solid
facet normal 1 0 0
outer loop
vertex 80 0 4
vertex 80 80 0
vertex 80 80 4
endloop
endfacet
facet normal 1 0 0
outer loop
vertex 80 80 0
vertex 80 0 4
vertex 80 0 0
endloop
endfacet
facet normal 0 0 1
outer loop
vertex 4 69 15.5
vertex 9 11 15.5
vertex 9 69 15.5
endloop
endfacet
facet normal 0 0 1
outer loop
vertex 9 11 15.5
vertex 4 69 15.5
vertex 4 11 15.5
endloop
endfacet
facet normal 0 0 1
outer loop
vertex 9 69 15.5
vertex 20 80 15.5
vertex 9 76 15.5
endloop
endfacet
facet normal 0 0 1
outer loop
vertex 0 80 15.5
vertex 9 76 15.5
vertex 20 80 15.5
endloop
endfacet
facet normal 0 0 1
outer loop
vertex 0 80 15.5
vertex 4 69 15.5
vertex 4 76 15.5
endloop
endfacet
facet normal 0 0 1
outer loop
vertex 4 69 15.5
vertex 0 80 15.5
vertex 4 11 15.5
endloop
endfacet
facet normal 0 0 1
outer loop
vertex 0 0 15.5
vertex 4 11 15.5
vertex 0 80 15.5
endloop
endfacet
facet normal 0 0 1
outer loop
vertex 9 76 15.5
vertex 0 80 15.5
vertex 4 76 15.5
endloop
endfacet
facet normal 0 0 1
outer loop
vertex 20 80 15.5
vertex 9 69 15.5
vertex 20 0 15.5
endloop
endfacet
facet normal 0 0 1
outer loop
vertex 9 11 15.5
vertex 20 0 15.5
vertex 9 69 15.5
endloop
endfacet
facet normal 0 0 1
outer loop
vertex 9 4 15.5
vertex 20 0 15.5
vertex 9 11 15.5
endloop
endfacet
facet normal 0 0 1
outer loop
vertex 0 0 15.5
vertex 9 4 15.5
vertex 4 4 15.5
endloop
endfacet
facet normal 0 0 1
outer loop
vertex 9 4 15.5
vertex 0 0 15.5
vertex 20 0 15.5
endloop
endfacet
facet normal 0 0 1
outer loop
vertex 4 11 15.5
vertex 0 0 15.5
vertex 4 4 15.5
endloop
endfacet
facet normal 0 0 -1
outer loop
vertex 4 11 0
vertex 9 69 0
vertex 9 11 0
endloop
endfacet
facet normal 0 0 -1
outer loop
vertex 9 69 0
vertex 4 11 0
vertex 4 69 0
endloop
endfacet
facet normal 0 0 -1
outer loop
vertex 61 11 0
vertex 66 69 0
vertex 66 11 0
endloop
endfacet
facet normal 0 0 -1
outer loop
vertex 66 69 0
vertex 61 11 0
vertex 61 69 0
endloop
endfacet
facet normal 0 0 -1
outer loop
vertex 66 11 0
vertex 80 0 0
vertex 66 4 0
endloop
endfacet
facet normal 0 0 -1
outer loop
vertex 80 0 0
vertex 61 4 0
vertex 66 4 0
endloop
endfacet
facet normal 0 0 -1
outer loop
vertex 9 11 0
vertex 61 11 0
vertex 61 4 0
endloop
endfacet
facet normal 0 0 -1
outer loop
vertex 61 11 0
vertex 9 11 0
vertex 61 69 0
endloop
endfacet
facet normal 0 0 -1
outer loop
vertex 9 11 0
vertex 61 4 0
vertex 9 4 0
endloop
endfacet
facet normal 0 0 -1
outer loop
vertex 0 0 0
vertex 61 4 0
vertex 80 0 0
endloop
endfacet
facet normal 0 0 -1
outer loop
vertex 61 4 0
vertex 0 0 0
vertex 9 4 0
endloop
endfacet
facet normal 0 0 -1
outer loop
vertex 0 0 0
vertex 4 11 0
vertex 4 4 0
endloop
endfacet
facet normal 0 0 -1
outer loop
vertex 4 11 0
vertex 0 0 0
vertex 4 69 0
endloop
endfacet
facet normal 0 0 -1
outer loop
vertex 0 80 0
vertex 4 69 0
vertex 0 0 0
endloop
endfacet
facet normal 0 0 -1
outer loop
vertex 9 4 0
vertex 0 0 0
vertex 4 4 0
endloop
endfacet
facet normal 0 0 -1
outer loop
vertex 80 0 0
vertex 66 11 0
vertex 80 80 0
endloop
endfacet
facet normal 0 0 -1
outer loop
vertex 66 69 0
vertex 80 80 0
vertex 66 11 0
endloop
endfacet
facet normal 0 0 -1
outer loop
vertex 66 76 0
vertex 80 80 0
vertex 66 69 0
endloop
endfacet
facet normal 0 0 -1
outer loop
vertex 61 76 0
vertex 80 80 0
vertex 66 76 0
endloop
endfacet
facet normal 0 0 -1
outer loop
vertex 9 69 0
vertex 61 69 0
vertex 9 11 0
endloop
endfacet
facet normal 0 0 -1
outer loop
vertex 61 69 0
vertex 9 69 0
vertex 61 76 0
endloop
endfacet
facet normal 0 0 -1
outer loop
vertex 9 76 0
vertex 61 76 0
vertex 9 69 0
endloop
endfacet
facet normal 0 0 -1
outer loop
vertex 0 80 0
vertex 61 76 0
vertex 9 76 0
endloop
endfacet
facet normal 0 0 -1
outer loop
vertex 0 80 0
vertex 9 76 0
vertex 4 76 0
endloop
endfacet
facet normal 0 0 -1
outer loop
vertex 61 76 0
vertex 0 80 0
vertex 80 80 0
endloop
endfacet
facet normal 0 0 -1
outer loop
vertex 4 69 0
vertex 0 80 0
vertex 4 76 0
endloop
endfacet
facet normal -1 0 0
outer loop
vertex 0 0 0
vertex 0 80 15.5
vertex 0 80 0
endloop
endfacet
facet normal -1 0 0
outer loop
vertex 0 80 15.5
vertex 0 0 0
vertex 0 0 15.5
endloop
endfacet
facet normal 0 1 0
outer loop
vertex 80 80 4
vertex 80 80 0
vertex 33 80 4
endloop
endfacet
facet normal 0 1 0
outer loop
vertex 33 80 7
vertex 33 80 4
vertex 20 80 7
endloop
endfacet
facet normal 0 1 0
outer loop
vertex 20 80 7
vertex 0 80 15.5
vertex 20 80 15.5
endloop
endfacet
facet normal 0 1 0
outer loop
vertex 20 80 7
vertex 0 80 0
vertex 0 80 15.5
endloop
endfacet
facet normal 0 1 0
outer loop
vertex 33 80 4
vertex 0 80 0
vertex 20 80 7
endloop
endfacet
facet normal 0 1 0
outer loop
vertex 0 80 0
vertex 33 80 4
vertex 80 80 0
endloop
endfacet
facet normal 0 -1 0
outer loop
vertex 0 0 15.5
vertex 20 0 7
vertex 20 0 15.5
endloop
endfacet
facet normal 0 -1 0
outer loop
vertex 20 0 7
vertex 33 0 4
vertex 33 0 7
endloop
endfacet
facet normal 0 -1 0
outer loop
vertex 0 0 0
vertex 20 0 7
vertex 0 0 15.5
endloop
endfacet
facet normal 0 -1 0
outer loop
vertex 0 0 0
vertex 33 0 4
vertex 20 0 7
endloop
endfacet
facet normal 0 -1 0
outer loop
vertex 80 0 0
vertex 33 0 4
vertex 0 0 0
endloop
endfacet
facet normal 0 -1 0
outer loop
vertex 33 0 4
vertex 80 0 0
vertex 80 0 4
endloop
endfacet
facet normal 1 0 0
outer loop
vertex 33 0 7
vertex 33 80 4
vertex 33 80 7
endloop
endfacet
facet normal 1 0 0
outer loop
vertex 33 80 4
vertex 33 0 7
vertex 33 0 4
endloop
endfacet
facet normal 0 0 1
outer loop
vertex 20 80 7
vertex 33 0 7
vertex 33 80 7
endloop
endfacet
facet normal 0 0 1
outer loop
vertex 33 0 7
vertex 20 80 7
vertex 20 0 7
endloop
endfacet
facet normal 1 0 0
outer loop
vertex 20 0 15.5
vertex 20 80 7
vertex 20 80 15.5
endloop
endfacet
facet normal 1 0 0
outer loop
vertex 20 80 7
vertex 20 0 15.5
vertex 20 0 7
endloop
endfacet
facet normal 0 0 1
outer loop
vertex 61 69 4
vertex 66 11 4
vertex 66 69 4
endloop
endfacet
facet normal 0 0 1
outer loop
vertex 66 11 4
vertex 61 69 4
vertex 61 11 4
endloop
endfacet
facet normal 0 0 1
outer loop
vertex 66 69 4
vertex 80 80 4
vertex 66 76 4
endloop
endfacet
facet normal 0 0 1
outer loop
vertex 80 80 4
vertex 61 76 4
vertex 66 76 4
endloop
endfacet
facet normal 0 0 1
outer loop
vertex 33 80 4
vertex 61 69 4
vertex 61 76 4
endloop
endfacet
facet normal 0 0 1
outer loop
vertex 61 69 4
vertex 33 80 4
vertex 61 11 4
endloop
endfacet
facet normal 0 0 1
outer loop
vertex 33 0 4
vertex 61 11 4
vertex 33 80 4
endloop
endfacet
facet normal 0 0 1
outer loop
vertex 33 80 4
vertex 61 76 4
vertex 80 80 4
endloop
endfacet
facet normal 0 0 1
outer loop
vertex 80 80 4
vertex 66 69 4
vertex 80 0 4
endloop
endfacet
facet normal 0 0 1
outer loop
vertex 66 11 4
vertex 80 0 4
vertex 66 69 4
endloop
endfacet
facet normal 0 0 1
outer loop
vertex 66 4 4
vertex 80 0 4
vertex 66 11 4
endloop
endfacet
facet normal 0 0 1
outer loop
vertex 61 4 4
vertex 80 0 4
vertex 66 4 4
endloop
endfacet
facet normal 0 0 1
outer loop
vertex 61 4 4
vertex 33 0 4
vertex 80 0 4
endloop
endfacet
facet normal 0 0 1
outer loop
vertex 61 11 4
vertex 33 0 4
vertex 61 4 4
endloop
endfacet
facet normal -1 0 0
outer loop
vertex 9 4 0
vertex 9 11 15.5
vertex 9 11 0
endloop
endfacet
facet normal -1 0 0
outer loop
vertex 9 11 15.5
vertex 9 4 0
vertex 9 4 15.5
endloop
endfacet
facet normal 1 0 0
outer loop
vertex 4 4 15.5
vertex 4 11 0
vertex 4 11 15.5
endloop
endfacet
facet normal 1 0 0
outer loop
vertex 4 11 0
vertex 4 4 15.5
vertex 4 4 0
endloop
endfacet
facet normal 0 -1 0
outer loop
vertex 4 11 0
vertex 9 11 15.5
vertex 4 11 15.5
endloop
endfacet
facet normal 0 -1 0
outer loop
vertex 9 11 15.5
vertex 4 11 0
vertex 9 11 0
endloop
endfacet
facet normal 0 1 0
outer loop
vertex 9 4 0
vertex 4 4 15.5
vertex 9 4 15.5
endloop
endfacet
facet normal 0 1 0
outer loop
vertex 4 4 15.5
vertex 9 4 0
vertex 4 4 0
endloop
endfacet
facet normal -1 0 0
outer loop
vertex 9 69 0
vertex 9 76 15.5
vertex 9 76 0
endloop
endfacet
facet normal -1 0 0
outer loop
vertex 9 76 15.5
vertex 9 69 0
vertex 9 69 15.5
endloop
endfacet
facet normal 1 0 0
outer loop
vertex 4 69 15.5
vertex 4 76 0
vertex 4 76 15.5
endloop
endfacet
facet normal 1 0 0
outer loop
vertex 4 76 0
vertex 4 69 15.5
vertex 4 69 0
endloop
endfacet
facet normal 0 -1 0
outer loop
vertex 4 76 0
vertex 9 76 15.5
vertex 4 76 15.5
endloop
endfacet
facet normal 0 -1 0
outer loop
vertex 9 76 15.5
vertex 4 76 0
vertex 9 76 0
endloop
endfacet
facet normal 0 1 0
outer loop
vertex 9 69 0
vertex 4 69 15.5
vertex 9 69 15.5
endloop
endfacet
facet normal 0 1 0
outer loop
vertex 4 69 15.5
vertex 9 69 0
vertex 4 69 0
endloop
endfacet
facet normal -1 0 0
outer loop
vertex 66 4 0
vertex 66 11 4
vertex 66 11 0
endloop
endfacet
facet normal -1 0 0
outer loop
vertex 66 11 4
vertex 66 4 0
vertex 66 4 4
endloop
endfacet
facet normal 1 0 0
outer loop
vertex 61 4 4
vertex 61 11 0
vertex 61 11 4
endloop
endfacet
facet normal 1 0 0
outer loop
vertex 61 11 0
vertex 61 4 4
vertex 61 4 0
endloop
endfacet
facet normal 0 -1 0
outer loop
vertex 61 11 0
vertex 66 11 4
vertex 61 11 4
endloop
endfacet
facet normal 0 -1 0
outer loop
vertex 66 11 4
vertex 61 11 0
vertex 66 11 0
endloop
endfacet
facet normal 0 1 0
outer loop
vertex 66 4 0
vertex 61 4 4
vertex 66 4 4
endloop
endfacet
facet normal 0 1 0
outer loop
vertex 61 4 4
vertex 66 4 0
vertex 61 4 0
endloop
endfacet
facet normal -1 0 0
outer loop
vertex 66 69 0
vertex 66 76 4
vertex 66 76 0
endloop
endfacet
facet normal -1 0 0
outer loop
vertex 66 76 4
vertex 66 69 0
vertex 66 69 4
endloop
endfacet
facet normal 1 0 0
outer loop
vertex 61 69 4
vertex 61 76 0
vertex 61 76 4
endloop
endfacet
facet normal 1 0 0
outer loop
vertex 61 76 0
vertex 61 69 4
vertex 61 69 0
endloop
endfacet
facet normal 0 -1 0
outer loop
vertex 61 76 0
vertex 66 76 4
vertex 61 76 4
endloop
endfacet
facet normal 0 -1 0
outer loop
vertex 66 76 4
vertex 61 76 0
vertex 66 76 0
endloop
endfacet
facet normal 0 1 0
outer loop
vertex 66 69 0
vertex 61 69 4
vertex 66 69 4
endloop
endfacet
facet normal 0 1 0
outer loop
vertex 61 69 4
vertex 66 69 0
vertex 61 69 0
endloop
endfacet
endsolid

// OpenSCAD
module motor_support() {
   difference() {
	// 3-level structure:
	color("yellow") cube([80, 80, 15.5], center=false);
	color("red") translate([20, 0, 7]) cube([13, 80, 8.5], center=false);
	translate([33, 0, 4]) cube([47, 80, 11.5], center=false);

	// holes:
	color("blue") translate([4, 4, 0]) cube([5, 7, 15.5], center=false);
	color("blue") translate([4, 69, 0]) cube([5, 7, 15.5], center=false);
	color("blue") translate([61, 4, 0]) cube([5, 7, 4], center=false);
	color("blue") translate([61, 69, 0]) cube([5, 7, 4], center=false);
   }
}

motor_support();
